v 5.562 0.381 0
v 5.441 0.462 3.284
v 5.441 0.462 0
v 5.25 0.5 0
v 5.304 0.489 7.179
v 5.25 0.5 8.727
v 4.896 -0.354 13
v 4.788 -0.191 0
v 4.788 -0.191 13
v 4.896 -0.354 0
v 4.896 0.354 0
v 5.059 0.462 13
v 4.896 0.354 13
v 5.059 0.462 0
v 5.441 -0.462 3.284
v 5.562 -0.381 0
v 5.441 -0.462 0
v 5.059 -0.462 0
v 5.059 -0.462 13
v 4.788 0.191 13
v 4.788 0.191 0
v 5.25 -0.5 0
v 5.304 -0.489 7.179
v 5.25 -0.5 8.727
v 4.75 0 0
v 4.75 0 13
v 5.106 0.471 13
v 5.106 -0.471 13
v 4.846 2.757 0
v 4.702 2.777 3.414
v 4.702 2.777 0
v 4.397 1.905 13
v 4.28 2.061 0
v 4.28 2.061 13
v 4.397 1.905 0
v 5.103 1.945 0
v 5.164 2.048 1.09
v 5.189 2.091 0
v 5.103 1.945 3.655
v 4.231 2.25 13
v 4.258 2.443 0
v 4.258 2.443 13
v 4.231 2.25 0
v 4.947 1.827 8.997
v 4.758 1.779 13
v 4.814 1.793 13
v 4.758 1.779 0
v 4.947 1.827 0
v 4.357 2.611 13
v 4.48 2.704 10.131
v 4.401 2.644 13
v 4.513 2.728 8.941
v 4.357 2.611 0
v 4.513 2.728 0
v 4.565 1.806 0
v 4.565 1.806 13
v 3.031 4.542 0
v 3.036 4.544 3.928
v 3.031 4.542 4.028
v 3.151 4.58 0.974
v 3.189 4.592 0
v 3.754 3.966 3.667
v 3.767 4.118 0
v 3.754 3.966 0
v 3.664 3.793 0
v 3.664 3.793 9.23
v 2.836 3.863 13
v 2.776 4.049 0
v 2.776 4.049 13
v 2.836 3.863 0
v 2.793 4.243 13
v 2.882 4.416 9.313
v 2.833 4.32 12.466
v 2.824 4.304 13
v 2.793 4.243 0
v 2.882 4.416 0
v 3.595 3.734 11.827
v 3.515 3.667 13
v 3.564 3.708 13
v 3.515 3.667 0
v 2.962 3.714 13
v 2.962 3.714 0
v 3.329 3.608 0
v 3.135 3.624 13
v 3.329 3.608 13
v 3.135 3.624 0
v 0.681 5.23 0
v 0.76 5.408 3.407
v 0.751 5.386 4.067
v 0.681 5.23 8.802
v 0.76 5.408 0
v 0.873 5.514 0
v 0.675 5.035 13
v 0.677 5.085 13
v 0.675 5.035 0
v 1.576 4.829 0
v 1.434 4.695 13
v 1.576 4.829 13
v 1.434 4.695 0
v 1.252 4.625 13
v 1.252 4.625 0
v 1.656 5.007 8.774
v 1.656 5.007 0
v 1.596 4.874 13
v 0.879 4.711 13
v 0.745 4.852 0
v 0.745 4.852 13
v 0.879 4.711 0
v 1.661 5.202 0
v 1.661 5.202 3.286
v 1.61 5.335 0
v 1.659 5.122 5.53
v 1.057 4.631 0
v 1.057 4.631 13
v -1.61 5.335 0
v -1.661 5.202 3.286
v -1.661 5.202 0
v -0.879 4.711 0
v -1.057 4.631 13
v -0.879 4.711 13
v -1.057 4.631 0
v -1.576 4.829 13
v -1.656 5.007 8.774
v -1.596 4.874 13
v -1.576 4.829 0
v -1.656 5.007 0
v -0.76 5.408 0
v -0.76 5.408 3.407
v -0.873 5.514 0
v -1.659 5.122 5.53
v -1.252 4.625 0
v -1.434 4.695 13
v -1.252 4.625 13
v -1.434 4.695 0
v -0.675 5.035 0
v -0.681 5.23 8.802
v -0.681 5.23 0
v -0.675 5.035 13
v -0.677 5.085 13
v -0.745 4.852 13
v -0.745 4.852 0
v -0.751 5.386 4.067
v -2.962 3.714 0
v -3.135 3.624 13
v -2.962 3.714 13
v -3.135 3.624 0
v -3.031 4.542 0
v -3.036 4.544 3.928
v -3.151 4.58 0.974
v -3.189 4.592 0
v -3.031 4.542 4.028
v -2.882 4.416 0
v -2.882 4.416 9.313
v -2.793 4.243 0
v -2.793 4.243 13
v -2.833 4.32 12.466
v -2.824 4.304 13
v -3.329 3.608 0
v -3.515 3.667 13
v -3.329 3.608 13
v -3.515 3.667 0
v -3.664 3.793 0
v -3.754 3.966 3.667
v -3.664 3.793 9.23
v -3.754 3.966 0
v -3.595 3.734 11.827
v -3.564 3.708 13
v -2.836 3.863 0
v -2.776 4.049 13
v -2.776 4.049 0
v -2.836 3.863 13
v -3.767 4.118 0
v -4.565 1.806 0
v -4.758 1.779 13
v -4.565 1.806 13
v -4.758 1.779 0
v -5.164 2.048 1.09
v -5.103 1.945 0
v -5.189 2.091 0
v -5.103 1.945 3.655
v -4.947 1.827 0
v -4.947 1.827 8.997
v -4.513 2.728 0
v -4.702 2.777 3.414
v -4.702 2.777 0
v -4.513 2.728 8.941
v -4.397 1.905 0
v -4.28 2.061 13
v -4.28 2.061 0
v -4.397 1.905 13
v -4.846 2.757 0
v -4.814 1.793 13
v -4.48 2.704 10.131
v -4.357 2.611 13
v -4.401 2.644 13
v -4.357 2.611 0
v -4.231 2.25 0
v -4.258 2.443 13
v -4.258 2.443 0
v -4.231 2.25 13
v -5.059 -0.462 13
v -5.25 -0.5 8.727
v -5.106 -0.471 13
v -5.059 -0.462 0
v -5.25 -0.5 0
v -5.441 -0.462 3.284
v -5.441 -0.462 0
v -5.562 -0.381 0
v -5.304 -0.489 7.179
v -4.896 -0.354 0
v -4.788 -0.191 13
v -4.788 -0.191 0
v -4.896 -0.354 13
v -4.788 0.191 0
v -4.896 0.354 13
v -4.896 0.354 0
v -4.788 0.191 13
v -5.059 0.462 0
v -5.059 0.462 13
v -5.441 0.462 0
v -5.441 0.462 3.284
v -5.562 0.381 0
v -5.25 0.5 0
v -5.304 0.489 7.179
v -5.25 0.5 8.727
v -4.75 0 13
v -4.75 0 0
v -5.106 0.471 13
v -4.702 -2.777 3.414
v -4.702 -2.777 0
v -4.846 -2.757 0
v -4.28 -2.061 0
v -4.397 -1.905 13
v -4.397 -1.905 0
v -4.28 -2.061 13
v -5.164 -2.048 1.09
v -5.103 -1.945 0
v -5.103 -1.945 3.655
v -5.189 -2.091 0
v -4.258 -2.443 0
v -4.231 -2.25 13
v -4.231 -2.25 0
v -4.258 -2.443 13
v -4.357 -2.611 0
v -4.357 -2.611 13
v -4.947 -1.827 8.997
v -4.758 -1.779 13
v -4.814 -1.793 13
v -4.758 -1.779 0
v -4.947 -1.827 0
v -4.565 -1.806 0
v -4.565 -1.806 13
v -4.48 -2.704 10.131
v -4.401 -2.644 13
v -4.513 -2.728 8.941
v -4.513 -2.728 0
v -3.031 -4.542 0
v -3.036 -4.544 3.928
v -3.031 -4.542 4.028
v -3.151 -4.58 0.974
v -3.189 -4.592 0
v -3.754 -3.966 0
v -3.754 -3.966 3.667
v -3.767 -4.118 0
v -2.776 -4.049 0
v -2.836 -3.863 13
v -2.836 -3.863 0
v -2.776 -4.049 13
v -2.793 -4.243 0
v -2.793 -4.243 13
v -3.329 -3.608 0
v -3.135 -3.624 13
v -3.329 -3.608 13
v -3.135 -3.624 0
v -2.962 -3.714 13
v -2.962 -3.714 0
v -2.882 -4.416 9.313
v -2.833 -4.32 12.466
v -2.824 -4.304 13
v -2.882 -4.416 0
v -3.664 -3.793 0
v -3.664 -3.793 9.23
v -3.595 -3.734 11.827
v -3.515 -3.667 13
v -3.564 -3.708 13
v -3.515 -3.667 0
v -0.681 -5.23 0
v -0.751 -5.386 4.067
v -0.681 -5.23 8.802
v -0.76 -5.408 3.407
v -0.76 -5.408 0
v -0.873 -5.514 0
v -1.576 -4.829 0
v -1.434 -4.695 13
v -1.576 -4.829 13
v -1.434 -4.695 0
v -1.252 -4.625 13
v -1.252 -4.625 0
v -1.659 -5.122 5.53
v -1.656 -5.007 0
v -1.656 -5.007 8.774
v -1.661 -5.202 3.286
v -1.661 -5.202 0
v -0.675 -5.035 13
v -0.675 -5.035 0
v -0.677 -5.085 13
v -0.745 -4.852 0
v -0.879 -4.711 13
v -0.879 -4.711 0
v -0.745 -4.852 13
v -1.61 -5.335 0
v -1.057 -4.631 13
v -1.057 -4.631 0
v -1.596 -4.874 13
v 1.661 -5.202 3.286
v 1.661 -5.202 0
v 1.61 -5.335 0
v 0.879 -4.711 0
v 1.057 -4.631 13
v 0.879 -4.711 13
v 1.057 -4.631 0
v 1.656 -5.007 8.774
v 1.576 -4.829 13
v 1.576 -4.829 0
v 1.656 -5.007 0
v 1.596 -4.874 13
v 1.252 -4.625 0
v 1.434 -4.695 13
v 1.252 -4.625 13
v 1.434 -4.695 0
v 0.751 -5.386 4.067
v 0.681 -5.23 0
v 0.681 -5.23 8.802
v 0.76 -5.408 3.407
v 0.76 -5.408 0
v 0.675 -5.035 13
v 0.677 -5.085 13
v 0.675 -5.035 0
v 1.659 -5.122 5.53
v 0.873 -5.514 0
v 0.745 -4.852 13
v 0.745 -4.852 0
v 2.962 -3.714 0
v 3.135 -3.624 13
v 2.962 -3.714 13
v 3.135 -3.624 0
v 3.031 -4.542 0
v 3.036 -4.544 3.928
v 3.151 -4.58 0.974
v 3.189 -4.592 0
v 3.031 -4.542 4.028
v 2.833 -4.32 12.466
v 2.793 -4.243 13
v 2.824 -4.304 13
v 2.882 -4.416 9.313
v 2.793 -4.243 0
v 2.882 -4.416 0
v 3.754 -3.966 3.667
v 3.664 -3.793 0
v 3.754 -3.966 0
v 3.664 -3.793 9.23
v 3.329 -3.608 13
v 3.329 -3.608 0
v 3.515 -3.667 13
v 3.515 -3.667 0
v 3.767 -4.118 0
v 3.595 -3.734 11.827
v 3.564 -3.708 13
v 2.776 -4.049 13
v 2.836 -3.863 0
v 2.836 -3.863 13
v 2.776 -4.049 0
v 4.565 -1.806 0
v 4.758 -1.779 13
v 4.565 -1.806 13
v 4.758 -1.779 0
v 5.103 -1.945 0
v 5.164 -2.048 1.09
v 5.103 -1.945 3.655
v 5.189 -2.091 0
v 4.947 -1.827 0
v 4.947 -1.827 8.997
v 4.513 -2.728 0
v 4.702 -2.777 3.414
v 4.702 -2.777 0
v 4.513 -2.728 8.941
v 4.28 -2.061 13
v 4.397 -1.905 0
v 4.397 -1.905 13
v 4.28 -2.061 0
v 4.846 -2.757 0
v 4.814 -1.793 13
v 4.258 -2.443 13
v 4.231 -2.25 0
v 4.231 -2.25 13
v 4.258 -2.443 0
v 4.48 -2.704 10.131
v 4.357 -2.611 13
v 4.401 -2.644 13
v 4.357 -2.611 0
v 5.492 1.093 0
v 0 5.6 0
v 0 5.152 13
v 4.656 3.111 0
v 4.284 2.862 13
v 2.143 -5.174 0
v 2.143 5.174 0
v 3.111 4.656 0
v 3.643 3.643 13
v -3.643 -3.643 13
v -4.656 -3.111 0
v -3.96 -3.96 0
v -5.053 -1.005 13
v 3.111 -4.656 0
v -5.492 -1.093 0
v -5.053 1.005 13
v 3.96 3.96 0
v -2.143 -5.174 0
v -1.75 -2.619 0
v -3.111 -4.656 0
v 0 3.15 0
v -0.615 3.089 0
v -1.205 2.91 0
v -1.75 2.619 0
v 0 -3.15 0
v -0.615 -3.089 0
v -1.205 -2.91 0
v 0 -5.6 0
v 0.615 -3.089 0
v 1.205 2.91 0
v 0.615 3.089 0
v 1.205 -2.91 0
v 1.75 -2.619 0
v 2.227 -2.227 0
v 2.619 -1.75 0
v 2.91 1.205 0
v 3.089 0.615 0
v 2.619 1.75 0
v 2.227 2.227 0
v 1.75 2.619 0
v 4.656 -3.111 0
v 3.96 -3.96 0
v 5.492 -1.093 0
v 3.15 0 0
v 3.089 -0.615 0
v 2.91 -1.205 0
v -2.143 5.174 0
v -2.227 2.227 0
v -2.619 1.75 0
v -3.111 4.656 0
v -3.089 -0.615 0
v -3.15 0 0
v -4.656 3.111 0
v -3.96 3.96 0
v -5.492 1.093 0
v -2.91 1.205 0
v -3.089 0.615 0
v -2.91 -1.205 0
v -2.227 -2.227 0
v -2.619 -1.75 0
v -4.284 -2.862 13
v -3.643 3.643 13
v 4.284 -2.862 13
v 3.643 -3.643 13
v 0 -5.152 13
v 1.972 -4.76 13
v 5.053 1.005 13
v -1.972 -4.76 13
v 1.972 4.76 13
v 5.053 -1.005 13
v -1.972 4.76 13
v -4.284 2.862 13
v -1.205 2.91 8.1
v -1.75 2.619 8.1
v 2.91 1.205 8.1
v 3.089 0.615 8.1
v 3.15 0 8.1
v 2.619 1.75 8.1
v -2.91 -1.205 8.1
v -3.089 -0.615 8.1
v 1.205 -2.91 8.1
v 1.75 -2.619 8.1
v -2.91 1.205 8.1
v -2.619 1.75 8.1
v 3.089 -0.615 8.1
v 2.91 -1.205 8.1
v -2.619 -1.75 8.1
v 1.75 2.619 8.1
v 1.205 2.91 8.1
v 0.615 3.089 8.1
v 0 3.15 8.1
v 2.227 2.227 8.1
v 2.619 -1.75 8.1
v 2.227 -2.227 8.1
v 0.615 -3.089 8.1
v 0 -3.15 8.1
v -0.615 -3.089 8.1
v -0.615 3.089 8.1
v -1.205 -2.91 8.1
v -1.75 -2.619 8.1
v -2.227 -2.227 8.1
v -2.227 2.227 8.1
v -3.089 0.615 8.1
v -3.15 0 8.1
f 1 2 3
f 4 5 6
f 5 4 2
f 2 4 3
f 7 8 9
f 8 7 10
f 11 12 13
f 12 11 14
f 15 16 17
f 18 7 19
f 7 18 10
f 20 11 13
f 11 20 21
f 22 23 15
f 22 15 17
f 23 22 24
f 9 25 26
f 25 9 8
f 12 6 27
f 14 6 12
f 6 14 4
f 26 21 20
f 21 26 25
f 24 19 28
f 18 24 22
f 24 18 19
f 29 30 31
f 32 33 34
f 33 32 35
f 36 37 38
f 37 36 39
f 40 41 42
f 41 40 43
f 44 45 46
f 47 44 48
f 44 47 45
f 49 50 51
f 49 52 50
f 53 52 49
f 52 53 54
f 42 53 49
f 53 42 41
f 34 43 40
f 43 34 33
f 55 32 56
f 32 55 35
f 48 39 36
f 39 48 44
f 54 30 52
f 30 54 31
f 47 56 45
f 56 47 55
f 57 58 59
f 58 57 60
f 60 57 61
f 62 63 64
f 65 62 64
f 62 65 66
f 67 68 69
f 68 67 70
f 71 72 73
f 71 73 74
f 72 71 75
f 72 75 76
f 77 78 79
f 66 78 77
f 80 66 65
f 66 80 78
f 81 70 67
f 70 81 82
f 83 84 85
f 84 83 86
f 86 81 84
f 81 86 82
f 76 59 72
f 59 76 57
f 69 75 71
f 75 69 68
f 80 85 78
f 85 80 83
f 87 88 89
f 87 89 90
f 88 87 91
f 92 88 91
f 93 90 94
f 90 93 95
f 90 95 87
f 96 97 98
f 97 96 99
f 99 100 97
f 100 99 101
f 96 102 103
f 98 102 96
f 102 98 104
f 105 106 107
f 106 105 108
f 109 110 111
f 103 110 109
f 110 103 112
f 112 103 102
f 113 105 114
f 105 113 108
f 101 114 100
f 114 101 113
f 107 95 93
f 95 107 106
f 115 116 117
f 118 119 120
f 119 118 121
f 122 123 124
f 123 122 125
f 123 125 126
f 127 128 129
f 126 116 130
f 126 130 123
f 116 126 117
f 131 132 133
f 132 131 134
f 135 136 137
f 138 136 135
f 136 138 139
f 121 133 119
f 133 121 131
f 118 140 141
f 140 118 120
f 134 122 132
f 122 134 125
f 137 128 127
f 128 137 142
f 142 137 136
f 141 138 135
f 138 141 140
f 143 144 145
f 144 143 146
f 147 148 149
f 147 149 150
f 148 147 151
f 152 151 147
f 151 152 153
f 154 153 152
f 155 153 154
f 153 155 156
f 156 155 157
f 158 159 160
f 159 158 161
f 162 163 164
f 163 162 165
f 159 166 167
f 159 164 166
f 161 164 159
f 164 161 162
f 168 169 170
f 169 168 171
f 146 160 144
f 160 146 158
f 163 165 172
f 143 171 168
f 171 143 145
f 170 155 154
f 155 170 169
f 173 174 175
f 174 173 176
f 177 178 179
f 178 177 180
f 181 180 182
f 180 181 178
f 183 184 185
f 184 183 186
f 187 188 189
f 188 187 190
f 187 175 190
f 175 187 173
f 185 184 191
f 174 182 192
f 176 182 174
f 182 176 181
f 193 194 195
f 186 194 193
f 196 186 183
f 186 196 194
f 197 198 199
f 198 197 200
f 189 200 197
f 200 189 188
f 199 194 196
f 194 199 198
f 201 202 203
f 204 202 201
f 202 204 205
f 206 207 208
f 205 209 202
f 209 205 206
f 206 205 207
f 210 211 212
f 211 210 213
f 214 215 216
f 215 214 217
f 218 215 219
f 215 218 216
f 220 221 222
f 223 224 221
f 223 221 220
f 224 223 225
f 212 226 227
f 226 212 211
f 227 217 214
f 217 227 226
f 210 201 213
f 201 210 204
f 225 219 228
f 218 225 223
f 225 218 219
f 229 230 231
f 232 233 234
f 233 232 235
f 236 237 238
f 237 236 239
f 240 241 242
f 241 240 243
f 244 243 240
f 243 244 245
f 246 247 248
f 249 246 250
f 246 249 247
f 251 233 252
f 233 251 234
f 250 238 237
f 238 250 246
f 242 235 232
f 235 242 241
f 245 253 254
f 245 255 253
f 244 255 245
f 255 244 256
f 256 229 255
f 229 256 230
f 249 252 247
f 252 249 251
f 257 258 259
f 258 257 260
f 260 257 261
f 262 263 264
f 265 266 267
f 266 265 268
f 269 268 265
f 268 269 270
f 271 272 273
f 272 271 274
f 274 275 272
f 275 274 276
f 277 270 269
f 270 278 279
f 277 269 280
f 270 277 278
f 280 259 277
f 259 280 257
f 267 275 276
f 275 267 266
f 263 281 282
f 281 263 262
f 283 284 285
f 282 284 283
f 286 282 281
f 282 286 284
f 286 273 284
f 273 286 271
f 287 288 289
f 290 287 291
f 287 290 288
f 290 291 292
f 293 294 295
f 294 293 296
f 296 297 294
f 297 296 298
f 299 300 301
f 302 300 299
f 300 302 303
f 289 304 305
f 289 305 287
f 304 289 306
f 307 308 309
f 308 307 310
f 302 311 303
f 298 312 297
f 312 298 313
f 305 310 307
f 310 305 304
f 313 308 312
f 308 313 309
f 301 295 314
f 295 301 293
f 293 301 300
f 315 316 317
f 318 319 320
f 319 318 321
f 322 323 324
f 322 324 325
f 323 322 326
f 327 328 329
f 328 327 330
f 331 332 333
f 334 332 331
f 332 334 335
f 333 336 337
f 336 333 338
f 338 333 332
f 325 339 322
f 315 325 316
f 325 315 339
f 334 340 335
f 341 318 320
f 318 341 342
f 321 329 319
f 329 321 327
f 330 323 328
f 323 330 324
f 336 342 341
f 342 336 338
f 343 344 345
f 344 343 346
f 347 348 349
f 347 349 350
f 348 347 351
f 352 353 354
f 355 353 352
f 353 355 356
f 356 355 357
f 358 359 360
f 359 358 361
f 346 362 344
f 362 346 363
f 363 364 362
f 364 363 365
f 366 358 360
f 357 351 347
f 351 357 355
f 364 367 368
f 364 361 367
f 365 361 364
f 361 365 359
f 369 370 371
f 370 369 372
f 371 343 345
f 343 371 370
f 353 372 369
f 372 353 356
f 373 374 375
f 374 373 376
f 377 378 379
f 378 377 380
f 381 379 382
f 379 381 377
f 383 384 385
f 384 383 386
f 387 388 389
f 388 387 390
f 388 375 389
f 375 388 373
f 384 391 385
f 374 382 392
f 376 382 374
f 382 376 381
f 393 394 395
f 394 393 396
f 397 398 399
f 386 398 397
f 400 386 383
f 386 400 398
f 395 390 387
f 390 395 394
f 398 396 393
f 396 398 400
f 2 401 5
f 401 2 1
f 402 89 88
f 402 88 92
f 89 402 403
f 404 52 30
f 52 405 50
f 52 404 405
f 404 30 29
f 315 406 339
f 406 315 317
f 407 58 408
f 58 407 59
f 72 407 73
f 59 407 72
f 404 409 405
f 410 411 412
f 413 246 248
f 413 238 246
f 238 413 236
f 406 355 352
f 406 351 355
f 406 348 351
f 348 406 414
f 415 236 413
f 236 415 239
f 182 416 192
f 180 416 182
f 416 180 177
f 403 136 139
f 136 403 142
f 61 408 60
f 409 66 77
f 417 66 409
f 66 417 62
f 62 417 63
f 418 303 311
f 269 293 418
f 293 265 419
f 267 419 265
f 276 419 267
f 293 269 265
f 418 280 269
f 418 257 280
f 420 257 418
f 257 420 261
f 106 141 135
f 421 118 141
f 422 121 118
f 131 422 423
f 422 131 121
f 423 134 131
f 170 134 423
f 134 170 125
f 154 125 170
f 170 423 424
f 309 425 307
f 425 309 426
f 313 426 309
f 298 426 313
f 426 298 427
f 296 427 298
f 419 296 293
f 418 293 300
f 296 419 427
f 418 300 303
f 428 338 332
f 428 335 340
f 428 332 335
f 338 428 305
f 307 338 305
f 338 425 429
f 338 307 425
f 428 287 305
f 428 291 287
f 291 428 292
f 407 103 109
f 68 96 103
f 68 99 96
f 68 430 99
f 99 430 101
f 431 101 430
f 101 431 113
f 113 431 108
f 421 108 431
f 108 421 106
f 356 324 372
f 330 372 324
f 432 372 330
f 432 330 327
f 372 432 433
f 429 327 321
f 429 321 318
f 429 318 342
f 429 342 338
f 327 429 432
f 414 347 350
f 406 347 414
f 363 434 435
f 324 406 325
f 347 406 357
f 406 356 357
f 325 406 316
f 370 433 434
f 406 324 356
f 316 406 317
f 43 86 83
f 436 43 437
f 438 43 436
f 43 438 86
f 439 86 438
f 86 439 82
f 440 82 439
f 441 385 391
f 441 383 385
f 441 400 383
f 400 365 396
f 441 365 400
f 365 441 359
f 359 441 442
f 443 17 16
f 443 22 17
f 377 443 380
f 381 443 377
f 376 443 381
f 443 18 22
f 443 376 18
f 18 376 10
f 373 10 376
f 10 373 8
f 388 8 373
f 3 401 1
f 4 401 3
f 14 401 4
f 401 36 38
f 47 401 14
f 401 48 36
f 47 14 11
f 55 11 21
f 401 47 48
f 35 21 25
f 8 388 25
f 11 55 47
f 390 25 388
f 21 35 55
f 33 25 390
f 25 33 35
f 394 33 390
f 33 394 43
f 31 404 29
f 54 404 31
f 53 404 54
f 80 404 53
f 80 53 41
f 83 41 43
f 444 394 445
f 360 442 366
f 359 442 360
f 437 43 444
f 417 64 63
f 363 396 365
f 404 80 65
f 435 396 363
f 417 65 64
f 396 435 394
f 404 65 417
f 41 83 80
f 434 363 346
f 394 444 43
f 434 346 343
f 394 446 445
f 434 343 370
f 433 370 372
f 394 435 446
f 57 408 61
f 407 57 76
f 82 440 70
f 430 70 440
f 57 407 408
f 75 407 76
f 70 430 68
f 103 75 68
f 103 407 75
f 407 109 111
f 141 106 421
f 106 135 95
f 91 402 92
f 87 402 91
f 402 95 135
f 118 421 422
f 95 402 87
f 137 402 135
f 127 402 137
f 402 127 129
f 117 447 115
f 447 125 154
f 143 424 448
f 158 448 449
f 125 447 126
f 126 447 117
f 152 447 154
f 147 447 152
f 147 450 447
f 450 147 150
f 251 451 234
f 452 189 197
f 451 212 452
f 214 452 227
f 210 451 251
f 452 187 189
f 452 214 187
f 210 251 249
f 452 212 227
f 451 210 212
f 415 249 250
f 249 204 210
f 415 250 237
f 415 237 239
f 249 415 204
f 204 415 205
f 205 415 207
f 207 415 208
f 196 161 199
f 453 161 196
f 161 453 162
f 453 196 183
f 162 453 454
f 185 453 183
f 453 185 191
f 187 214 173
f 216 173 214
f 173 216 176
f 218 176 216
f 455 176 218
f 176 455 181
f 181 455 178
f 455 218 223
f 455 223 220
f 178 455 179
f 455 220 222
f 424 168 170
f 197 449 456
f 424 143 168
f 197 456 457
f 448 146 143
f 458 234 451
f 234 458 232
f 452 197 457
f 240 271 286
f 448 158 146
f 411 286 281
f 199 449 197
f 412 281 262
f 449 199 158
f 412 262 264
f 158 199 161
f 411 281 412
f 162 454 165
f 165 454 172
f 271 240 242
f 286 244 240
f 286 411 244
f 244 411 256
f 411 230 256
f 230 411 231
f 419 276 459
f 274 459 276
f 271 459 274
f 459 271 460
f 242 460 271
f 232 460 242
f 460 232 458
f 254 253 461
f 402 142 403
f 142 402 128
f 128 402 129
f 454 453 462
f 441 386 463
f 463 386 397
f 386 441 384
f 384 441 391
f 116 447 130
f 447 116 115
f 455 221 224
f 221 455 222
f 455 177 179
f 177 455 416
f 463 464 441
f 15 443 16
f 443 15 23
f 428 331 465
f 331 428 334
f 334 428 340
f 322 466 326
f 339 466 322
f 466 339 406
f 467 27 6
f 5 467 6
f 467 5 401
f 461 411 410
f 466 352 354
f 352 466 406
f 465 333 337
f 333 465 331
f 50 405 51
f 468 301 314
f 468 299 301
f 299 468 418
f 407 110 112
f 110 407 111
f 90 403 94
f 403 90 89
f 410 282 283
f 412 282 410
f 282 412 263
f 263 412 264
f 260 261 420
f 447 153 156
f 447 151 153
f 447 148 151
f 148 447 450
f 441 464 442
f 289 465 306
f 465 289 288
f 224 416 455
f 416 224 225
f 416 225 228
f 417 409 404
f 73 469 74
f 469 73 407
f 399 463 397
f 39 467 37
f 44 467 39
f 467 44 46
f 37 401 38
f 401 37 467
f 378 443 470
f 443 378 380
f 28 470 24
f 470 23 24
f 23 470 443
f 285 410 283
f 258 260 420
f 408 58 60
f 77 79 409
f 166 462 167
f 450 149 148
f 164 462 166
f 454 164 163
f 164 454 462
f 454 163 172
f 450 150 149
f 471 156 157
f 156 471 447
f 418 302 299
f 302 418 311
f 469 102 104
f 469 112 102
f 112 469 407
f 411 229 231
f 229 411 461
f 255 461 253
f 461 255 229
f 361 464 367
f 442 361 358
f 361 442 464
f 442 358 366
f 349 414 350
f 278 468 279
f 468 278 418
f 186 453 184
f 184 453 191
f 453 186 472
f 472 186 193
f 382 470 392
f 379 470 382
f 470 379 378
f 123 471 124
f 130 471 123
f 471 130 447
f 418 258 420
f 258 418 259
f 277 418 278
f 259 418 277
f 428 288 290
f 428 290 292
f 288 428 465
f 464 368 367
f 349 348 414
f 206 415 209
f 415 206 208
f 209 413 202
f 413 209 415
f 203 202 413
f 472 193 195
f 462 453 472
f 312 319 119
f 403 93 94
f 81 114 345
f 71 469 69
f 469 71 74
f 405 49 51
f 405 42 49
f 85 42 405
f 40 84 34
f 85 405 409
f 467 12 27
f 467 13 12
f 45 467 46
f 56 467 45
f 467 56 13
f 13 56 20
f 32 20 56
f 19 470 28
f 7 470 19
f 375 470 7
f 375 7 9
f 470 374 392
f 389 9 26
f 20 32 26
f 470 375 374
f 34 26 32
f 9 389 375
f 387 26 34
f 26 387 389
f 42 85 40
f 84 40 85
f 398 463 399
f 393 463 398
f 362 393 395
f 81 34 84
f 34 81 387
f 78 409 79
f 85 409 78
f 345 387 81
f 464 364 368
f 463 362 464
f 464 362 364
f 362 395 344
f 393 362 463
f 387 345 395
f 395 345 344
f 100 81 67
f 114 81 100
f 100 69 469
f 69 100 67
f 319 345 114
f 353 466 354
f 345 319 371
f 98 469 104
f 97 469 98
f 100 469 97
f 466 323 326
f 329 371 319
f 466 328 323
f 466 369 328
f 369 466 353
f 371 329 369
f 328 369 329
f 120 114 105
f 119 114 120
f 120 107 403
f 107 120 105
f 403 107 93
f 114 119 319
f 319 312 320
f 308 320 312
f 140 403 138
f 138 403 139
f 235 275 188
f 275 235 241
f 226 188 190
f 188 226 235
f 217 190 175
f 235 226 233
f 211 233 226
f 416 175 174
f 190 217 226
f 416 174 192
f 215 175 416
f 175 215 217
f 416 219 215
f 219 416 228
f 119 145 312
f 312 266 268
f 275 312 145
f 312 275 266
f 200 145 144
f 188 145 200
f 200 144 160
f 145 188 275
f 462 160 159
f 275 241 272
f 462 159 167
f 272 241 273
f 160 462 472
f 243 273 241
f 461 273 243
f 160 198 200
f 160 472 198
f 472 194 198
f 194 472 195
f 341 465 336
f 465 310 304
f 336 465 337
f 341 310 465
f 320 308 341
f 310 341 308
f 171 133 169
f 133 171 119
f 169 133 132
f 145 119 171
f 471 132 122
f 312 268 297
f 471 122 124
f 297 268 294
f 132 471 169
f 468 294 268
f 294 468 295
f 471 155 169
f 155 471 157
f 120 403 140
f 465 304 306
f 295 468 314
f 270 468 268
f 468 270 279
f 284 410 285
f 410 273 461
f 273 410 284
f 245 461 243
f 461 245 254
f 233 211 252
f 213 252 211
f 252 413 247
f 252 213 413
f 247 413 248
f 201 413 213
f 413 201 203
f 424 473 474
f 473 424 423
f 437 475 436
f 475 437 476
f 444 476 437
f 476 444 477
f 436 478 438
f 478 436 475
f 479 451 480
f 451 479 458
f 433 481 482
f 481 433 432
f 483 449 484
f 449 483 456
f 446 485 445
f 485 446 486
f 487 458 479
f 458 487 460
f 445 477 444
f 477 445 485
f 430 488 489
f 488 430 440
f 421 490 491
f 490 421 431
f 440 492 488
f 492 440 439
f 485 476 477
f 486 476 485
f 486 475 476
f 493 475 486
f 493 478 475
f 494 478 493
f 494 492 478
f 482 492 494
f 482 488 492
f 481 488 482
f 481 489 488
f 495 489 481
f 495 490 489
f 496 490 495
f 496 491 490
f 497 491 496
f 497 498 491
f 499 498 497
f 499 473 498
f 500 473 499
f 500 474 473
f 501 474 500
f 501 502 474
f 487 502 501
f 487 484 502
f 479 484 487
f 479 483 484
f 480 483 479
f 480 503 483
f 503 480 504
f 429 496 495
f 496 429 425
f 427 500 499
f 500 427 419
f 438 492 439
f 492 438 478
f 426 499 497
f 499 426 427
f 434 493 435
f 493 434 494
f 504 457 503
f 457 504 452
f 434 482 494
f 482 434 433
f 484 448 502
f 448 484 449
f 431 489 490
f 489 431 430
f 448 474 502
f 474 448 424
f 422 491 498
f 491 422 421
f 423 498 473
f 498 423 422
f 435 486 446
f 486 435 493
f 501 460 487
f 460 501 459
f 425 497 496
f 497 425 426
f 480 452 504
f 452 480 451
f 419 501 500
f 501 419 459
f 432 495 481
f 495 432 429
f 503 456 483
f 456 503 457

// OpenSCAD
// ACCESS KNOB — Mutable Instruments Small Module Knob
// Generated via CLI for Studio Knobs
module access_knob_mi_small() {
  outer_d = 11.2;
  height = 13;
  taper = 0.92;
  bore_d = 6;
  slot_h = 8;
  tex_depth = 0.7;
  tex_scale = 1;
  tex_count = 14;

  difference() {
    cylinder(h=height, d1=outer_d, d2=outer_d*taper, $fn=32);
    translate([0,0,-0.1]) cylinder(h=slot_h+0.2, d=bore_d + 0.3, $fn=32);
    for(i=[0:tex_count-1]) {
      rotate([0,0,i*(360/tex_count)])
        translate([outer_d/2-tex_depth/2, 0, height/2])
          cylinder(h=height*1.1, d=tex_scale, center=true, $fn=16);
    }
  }
}
access_knob_mi_small();
